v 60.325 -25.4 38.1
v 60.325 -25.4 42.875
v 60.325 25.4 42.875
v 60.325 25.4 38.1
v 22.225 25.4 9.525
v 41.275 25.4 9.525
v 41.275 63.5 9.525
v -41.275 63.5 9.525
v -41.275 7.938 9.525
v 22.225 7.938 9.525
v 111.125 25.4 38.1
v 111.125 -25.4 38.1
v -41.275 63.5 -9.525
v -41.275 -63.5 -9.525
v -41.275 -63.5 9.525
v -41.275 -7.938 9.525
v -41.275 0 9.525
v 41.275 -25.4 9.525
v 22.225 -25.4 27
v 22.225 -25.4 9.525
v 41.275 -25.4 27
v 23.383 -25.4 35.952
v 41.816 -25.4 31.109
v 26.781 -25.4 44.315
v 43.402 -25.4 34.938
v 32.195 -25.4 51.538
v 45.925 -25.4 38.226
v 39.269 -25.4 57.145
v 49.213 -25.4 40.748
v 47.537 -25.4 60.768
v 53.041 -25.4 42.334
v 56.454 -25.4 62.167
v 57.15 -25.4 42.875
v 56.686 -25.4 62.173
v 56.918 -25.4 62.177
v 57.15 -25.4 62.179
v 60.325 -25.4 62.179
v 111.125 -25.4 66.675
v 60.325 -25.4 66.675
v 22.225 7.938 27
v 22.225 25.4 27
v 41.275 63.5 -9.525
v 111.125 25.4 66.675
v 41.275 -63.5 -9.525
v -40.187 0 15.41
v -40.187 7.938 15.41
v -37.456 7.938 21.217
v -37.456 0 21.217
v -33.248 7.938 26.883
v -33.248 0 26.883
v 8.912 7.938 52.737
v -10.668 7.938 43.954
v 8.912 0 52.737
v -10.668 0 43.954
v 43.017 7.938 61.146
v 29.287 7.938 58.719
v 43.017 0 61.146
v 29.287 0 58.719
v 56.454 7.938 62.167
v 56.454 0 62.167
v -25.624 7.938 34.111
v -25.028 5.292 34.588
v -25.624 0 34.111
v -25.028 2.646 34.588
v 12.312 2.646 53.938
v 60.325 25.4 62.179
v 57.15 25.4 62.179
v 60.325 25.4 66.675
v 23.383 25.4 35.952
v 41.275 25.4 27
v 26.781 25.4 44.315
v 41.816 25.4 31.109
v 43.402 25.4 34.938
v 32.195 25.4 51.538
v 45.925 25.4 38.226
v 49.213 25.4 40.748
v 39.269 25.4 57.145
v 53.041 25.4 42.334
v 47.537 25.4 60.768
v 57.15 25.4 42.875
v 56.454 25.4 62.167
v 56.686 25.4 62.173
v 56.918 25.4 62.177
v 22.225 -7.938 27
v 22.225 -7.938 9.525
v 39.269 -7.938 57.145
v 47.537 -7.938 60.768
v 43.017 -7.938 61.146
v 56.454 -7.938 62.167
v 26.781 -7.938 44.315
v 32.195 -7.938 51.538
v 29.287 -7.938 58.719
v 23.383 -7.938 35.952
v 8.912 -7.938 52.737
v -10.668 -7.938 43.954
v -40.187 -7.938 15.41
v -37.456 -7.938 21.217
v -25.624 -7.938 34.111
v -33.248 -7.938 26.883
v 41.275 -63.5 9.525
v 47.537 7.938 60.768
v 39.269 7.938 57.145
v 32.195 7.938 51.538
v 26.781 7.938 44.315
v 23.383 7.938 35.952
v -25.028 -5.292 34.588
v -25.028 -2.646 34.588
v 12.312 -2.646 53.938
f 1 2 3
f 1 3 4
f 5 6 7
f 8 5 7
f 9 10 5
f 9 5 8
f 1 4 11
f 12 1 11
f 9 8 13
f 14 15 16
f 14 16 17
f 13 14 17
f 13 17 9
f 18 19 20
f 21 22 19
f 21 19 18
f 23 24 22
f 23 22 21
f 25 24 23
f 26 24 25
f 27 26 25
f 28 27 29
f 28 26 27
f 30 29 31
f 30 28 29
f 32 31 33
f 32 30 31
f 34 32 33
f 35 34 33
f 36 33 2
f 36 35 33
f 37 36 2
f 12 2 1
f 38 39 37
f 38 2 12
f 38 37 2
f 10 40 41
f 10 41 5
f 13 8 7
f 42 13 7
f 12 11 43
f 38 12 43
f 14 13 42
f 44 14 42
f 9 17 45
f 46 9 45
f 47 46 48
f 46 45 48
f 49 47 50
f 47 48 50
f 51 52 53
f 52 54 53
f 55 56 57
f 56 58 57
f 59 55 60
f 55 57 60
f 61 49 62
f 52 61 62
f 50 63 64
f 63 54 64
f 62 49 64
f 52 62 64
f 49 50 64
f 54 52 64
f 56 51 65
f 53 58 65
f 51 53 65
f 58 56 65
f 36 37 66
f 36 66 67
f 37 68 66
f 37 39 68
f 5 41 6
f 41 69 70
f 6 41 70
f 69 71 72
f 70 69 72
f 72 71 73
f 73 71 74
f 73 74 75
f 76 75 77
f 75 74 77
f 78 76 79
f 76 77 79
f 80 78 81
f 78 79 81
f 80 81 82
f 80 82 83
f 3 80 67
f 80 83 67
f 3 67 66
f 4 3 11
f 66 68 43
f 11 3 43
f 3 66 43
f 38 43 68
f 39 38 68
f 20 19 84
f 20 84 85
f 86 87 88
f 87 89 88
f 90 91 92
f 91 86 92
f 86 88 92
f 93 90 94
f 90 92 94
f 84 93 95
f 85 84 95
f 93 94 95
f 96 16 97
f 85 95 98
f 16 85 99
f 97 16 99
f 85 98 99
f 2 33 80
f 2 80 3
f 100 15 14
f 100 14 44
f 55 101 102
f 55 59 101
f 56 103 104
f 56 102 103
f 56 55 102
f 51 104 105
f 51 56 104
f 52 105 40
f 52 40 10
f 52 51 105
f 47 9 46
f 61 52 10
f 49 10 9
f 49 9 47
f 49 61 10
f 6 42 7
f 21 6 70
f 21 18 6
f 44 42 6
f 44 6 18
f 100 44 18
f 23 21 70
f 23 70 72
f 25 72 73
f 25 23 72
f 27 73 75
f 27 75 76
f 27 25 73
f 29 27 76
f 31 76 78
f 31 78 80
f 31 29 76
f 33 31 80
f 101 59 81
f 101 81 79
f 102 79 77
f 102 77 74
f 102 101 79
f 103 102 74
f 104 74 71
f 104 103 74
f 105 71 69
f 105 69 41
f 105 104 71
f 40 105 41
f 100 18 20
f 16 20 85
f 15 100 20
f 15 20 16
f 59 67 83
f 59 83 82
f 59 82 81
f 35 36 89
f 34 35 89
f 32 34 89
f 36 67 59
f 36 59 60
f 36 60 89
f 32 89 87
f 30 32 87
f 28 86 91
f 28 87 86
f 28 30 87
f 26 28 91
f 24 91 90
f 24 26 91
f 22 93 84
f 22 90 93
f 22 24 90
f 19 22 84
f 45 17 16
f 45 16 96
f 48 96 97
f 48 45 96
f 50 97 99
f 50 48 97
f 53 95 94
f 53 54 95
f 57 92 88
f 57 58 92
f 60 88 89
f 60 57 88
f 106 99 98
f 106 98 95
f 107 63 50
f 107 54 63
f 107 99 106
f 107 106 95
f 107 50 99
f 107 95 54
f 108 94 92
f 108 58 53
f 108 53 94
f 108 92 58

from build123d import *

# Parameters (mm, degrees)
F1_DEPTH = 63.5
F2_DEPTH = 25.4
F3_DEPTH = 7.9375


with BuildPart() as f1:
    # F0 (on Front) → F1 (new body, symmetric)
    with BuildSketch(Plane.XZ):
        Polygon((22.225, 9.525), (-41.275, 9.525), (-41.275, -9.525), (41.275, -9.525), (41.275, 9.525), align=None)
    extrude(amount=F1_DEPTH, both=True)

    # F0 (on Front) → F2 (join, symmetric)
    with BuildSketch(Plane.XZ):
        Polygon((60.325, 66.675), (60.325, 62.1792), (60.325, 42.8752), (60.325, 38.1), (111.125, 38.1), (111.125, 66.675), align=None)
        with BuildLine():
            ThreePointArc((57.15, 62.1792), (56.801973539, 62.1749562641), (56.4540060954, 62.1672695807))
            add(Edge.make_bspline(
                [(56.4540060954, 62.1672695807), (56.6863388741, 62.1719788985), (56.9183402764, 62.1759570041), (57.15, 62.1792)],
                knots=[111.0211671493, 111.0211671493, 111.0211671493, 111.0211671493, 111.6241255403, 111.6241255403, 111.6241255403, 111.6241255403], degree=3))
        make_face()
        Polygon((22.225, 9.525), (-41.275, 9.525), (-41.275, -9.525), (41.275, -9.525), (41.275, 9.525), align=None)
        with BuildLine():
            Line((22.225, 27.0002), (22.225, 9.525))
            Line((22.225, 9.525), (41.275, 9.525))
            Line((41.275, 9.525), (41.275, 27.0002))
            ThreePointArc((41.275, 27.0002), (45.9246798487, 38.2255201513), (57.15, 42.8752))
            Line((57.15, 42.8752), (60.325, 42.8752))
            Line((60.325, 42.8752), (60.325, 62.1792))
            Line((60.325, 62.1792), (57.15, 62.1792))
            add(Edge.make_bspline(
                [(56.4540060954, 62.1672695807), (56.6863388741, 62.1719788985), (56.9183402764, 62.1759570041), (57.15, 62.1792)],
                knots=[111.0211671493, 111.0211671493, 111.0211671493, 111.0211671493, 111.6241255403, 111.6241255403, 111.6241255403, 111.6241255403], degree=3))
            ThreePointArc((56.4540060954, 62.1672695807), (32.1950026375, 51.5376593284), (22.225, 27.0002))
        make_face()
    extrude(amount=F2_DEPTH, both=True)

    # F0 (on Front) → F3 (join, symmetric)
    with BuildSketch(Plane.XZ):
        with BuildLine():
            add(Edge.make_bspline(
                [(-41.275, 9.525), (-40.3382838468, 35.6428227529), (13.6751731786, 61.3001550814), (56.4540060954, 62.1672695807)],
                knots=[0, 0, 0, 0, 111.0211671493, 111.0211671493, 111.0211671493, 111.0211671493], degree=3))
            Line((-41.275, 9.525), (22.225, 9.525))
            Line((22.225, 9.525), (22.225, 27.0002))
            ThreePointArc((22.225, 27.0002), (32.1950026375, 51.5376593284), (56.4540060954, 62.1672695807))
        make_face()
    extrude(amount=F3_DEPTH, both=True)


solid = f1.part
